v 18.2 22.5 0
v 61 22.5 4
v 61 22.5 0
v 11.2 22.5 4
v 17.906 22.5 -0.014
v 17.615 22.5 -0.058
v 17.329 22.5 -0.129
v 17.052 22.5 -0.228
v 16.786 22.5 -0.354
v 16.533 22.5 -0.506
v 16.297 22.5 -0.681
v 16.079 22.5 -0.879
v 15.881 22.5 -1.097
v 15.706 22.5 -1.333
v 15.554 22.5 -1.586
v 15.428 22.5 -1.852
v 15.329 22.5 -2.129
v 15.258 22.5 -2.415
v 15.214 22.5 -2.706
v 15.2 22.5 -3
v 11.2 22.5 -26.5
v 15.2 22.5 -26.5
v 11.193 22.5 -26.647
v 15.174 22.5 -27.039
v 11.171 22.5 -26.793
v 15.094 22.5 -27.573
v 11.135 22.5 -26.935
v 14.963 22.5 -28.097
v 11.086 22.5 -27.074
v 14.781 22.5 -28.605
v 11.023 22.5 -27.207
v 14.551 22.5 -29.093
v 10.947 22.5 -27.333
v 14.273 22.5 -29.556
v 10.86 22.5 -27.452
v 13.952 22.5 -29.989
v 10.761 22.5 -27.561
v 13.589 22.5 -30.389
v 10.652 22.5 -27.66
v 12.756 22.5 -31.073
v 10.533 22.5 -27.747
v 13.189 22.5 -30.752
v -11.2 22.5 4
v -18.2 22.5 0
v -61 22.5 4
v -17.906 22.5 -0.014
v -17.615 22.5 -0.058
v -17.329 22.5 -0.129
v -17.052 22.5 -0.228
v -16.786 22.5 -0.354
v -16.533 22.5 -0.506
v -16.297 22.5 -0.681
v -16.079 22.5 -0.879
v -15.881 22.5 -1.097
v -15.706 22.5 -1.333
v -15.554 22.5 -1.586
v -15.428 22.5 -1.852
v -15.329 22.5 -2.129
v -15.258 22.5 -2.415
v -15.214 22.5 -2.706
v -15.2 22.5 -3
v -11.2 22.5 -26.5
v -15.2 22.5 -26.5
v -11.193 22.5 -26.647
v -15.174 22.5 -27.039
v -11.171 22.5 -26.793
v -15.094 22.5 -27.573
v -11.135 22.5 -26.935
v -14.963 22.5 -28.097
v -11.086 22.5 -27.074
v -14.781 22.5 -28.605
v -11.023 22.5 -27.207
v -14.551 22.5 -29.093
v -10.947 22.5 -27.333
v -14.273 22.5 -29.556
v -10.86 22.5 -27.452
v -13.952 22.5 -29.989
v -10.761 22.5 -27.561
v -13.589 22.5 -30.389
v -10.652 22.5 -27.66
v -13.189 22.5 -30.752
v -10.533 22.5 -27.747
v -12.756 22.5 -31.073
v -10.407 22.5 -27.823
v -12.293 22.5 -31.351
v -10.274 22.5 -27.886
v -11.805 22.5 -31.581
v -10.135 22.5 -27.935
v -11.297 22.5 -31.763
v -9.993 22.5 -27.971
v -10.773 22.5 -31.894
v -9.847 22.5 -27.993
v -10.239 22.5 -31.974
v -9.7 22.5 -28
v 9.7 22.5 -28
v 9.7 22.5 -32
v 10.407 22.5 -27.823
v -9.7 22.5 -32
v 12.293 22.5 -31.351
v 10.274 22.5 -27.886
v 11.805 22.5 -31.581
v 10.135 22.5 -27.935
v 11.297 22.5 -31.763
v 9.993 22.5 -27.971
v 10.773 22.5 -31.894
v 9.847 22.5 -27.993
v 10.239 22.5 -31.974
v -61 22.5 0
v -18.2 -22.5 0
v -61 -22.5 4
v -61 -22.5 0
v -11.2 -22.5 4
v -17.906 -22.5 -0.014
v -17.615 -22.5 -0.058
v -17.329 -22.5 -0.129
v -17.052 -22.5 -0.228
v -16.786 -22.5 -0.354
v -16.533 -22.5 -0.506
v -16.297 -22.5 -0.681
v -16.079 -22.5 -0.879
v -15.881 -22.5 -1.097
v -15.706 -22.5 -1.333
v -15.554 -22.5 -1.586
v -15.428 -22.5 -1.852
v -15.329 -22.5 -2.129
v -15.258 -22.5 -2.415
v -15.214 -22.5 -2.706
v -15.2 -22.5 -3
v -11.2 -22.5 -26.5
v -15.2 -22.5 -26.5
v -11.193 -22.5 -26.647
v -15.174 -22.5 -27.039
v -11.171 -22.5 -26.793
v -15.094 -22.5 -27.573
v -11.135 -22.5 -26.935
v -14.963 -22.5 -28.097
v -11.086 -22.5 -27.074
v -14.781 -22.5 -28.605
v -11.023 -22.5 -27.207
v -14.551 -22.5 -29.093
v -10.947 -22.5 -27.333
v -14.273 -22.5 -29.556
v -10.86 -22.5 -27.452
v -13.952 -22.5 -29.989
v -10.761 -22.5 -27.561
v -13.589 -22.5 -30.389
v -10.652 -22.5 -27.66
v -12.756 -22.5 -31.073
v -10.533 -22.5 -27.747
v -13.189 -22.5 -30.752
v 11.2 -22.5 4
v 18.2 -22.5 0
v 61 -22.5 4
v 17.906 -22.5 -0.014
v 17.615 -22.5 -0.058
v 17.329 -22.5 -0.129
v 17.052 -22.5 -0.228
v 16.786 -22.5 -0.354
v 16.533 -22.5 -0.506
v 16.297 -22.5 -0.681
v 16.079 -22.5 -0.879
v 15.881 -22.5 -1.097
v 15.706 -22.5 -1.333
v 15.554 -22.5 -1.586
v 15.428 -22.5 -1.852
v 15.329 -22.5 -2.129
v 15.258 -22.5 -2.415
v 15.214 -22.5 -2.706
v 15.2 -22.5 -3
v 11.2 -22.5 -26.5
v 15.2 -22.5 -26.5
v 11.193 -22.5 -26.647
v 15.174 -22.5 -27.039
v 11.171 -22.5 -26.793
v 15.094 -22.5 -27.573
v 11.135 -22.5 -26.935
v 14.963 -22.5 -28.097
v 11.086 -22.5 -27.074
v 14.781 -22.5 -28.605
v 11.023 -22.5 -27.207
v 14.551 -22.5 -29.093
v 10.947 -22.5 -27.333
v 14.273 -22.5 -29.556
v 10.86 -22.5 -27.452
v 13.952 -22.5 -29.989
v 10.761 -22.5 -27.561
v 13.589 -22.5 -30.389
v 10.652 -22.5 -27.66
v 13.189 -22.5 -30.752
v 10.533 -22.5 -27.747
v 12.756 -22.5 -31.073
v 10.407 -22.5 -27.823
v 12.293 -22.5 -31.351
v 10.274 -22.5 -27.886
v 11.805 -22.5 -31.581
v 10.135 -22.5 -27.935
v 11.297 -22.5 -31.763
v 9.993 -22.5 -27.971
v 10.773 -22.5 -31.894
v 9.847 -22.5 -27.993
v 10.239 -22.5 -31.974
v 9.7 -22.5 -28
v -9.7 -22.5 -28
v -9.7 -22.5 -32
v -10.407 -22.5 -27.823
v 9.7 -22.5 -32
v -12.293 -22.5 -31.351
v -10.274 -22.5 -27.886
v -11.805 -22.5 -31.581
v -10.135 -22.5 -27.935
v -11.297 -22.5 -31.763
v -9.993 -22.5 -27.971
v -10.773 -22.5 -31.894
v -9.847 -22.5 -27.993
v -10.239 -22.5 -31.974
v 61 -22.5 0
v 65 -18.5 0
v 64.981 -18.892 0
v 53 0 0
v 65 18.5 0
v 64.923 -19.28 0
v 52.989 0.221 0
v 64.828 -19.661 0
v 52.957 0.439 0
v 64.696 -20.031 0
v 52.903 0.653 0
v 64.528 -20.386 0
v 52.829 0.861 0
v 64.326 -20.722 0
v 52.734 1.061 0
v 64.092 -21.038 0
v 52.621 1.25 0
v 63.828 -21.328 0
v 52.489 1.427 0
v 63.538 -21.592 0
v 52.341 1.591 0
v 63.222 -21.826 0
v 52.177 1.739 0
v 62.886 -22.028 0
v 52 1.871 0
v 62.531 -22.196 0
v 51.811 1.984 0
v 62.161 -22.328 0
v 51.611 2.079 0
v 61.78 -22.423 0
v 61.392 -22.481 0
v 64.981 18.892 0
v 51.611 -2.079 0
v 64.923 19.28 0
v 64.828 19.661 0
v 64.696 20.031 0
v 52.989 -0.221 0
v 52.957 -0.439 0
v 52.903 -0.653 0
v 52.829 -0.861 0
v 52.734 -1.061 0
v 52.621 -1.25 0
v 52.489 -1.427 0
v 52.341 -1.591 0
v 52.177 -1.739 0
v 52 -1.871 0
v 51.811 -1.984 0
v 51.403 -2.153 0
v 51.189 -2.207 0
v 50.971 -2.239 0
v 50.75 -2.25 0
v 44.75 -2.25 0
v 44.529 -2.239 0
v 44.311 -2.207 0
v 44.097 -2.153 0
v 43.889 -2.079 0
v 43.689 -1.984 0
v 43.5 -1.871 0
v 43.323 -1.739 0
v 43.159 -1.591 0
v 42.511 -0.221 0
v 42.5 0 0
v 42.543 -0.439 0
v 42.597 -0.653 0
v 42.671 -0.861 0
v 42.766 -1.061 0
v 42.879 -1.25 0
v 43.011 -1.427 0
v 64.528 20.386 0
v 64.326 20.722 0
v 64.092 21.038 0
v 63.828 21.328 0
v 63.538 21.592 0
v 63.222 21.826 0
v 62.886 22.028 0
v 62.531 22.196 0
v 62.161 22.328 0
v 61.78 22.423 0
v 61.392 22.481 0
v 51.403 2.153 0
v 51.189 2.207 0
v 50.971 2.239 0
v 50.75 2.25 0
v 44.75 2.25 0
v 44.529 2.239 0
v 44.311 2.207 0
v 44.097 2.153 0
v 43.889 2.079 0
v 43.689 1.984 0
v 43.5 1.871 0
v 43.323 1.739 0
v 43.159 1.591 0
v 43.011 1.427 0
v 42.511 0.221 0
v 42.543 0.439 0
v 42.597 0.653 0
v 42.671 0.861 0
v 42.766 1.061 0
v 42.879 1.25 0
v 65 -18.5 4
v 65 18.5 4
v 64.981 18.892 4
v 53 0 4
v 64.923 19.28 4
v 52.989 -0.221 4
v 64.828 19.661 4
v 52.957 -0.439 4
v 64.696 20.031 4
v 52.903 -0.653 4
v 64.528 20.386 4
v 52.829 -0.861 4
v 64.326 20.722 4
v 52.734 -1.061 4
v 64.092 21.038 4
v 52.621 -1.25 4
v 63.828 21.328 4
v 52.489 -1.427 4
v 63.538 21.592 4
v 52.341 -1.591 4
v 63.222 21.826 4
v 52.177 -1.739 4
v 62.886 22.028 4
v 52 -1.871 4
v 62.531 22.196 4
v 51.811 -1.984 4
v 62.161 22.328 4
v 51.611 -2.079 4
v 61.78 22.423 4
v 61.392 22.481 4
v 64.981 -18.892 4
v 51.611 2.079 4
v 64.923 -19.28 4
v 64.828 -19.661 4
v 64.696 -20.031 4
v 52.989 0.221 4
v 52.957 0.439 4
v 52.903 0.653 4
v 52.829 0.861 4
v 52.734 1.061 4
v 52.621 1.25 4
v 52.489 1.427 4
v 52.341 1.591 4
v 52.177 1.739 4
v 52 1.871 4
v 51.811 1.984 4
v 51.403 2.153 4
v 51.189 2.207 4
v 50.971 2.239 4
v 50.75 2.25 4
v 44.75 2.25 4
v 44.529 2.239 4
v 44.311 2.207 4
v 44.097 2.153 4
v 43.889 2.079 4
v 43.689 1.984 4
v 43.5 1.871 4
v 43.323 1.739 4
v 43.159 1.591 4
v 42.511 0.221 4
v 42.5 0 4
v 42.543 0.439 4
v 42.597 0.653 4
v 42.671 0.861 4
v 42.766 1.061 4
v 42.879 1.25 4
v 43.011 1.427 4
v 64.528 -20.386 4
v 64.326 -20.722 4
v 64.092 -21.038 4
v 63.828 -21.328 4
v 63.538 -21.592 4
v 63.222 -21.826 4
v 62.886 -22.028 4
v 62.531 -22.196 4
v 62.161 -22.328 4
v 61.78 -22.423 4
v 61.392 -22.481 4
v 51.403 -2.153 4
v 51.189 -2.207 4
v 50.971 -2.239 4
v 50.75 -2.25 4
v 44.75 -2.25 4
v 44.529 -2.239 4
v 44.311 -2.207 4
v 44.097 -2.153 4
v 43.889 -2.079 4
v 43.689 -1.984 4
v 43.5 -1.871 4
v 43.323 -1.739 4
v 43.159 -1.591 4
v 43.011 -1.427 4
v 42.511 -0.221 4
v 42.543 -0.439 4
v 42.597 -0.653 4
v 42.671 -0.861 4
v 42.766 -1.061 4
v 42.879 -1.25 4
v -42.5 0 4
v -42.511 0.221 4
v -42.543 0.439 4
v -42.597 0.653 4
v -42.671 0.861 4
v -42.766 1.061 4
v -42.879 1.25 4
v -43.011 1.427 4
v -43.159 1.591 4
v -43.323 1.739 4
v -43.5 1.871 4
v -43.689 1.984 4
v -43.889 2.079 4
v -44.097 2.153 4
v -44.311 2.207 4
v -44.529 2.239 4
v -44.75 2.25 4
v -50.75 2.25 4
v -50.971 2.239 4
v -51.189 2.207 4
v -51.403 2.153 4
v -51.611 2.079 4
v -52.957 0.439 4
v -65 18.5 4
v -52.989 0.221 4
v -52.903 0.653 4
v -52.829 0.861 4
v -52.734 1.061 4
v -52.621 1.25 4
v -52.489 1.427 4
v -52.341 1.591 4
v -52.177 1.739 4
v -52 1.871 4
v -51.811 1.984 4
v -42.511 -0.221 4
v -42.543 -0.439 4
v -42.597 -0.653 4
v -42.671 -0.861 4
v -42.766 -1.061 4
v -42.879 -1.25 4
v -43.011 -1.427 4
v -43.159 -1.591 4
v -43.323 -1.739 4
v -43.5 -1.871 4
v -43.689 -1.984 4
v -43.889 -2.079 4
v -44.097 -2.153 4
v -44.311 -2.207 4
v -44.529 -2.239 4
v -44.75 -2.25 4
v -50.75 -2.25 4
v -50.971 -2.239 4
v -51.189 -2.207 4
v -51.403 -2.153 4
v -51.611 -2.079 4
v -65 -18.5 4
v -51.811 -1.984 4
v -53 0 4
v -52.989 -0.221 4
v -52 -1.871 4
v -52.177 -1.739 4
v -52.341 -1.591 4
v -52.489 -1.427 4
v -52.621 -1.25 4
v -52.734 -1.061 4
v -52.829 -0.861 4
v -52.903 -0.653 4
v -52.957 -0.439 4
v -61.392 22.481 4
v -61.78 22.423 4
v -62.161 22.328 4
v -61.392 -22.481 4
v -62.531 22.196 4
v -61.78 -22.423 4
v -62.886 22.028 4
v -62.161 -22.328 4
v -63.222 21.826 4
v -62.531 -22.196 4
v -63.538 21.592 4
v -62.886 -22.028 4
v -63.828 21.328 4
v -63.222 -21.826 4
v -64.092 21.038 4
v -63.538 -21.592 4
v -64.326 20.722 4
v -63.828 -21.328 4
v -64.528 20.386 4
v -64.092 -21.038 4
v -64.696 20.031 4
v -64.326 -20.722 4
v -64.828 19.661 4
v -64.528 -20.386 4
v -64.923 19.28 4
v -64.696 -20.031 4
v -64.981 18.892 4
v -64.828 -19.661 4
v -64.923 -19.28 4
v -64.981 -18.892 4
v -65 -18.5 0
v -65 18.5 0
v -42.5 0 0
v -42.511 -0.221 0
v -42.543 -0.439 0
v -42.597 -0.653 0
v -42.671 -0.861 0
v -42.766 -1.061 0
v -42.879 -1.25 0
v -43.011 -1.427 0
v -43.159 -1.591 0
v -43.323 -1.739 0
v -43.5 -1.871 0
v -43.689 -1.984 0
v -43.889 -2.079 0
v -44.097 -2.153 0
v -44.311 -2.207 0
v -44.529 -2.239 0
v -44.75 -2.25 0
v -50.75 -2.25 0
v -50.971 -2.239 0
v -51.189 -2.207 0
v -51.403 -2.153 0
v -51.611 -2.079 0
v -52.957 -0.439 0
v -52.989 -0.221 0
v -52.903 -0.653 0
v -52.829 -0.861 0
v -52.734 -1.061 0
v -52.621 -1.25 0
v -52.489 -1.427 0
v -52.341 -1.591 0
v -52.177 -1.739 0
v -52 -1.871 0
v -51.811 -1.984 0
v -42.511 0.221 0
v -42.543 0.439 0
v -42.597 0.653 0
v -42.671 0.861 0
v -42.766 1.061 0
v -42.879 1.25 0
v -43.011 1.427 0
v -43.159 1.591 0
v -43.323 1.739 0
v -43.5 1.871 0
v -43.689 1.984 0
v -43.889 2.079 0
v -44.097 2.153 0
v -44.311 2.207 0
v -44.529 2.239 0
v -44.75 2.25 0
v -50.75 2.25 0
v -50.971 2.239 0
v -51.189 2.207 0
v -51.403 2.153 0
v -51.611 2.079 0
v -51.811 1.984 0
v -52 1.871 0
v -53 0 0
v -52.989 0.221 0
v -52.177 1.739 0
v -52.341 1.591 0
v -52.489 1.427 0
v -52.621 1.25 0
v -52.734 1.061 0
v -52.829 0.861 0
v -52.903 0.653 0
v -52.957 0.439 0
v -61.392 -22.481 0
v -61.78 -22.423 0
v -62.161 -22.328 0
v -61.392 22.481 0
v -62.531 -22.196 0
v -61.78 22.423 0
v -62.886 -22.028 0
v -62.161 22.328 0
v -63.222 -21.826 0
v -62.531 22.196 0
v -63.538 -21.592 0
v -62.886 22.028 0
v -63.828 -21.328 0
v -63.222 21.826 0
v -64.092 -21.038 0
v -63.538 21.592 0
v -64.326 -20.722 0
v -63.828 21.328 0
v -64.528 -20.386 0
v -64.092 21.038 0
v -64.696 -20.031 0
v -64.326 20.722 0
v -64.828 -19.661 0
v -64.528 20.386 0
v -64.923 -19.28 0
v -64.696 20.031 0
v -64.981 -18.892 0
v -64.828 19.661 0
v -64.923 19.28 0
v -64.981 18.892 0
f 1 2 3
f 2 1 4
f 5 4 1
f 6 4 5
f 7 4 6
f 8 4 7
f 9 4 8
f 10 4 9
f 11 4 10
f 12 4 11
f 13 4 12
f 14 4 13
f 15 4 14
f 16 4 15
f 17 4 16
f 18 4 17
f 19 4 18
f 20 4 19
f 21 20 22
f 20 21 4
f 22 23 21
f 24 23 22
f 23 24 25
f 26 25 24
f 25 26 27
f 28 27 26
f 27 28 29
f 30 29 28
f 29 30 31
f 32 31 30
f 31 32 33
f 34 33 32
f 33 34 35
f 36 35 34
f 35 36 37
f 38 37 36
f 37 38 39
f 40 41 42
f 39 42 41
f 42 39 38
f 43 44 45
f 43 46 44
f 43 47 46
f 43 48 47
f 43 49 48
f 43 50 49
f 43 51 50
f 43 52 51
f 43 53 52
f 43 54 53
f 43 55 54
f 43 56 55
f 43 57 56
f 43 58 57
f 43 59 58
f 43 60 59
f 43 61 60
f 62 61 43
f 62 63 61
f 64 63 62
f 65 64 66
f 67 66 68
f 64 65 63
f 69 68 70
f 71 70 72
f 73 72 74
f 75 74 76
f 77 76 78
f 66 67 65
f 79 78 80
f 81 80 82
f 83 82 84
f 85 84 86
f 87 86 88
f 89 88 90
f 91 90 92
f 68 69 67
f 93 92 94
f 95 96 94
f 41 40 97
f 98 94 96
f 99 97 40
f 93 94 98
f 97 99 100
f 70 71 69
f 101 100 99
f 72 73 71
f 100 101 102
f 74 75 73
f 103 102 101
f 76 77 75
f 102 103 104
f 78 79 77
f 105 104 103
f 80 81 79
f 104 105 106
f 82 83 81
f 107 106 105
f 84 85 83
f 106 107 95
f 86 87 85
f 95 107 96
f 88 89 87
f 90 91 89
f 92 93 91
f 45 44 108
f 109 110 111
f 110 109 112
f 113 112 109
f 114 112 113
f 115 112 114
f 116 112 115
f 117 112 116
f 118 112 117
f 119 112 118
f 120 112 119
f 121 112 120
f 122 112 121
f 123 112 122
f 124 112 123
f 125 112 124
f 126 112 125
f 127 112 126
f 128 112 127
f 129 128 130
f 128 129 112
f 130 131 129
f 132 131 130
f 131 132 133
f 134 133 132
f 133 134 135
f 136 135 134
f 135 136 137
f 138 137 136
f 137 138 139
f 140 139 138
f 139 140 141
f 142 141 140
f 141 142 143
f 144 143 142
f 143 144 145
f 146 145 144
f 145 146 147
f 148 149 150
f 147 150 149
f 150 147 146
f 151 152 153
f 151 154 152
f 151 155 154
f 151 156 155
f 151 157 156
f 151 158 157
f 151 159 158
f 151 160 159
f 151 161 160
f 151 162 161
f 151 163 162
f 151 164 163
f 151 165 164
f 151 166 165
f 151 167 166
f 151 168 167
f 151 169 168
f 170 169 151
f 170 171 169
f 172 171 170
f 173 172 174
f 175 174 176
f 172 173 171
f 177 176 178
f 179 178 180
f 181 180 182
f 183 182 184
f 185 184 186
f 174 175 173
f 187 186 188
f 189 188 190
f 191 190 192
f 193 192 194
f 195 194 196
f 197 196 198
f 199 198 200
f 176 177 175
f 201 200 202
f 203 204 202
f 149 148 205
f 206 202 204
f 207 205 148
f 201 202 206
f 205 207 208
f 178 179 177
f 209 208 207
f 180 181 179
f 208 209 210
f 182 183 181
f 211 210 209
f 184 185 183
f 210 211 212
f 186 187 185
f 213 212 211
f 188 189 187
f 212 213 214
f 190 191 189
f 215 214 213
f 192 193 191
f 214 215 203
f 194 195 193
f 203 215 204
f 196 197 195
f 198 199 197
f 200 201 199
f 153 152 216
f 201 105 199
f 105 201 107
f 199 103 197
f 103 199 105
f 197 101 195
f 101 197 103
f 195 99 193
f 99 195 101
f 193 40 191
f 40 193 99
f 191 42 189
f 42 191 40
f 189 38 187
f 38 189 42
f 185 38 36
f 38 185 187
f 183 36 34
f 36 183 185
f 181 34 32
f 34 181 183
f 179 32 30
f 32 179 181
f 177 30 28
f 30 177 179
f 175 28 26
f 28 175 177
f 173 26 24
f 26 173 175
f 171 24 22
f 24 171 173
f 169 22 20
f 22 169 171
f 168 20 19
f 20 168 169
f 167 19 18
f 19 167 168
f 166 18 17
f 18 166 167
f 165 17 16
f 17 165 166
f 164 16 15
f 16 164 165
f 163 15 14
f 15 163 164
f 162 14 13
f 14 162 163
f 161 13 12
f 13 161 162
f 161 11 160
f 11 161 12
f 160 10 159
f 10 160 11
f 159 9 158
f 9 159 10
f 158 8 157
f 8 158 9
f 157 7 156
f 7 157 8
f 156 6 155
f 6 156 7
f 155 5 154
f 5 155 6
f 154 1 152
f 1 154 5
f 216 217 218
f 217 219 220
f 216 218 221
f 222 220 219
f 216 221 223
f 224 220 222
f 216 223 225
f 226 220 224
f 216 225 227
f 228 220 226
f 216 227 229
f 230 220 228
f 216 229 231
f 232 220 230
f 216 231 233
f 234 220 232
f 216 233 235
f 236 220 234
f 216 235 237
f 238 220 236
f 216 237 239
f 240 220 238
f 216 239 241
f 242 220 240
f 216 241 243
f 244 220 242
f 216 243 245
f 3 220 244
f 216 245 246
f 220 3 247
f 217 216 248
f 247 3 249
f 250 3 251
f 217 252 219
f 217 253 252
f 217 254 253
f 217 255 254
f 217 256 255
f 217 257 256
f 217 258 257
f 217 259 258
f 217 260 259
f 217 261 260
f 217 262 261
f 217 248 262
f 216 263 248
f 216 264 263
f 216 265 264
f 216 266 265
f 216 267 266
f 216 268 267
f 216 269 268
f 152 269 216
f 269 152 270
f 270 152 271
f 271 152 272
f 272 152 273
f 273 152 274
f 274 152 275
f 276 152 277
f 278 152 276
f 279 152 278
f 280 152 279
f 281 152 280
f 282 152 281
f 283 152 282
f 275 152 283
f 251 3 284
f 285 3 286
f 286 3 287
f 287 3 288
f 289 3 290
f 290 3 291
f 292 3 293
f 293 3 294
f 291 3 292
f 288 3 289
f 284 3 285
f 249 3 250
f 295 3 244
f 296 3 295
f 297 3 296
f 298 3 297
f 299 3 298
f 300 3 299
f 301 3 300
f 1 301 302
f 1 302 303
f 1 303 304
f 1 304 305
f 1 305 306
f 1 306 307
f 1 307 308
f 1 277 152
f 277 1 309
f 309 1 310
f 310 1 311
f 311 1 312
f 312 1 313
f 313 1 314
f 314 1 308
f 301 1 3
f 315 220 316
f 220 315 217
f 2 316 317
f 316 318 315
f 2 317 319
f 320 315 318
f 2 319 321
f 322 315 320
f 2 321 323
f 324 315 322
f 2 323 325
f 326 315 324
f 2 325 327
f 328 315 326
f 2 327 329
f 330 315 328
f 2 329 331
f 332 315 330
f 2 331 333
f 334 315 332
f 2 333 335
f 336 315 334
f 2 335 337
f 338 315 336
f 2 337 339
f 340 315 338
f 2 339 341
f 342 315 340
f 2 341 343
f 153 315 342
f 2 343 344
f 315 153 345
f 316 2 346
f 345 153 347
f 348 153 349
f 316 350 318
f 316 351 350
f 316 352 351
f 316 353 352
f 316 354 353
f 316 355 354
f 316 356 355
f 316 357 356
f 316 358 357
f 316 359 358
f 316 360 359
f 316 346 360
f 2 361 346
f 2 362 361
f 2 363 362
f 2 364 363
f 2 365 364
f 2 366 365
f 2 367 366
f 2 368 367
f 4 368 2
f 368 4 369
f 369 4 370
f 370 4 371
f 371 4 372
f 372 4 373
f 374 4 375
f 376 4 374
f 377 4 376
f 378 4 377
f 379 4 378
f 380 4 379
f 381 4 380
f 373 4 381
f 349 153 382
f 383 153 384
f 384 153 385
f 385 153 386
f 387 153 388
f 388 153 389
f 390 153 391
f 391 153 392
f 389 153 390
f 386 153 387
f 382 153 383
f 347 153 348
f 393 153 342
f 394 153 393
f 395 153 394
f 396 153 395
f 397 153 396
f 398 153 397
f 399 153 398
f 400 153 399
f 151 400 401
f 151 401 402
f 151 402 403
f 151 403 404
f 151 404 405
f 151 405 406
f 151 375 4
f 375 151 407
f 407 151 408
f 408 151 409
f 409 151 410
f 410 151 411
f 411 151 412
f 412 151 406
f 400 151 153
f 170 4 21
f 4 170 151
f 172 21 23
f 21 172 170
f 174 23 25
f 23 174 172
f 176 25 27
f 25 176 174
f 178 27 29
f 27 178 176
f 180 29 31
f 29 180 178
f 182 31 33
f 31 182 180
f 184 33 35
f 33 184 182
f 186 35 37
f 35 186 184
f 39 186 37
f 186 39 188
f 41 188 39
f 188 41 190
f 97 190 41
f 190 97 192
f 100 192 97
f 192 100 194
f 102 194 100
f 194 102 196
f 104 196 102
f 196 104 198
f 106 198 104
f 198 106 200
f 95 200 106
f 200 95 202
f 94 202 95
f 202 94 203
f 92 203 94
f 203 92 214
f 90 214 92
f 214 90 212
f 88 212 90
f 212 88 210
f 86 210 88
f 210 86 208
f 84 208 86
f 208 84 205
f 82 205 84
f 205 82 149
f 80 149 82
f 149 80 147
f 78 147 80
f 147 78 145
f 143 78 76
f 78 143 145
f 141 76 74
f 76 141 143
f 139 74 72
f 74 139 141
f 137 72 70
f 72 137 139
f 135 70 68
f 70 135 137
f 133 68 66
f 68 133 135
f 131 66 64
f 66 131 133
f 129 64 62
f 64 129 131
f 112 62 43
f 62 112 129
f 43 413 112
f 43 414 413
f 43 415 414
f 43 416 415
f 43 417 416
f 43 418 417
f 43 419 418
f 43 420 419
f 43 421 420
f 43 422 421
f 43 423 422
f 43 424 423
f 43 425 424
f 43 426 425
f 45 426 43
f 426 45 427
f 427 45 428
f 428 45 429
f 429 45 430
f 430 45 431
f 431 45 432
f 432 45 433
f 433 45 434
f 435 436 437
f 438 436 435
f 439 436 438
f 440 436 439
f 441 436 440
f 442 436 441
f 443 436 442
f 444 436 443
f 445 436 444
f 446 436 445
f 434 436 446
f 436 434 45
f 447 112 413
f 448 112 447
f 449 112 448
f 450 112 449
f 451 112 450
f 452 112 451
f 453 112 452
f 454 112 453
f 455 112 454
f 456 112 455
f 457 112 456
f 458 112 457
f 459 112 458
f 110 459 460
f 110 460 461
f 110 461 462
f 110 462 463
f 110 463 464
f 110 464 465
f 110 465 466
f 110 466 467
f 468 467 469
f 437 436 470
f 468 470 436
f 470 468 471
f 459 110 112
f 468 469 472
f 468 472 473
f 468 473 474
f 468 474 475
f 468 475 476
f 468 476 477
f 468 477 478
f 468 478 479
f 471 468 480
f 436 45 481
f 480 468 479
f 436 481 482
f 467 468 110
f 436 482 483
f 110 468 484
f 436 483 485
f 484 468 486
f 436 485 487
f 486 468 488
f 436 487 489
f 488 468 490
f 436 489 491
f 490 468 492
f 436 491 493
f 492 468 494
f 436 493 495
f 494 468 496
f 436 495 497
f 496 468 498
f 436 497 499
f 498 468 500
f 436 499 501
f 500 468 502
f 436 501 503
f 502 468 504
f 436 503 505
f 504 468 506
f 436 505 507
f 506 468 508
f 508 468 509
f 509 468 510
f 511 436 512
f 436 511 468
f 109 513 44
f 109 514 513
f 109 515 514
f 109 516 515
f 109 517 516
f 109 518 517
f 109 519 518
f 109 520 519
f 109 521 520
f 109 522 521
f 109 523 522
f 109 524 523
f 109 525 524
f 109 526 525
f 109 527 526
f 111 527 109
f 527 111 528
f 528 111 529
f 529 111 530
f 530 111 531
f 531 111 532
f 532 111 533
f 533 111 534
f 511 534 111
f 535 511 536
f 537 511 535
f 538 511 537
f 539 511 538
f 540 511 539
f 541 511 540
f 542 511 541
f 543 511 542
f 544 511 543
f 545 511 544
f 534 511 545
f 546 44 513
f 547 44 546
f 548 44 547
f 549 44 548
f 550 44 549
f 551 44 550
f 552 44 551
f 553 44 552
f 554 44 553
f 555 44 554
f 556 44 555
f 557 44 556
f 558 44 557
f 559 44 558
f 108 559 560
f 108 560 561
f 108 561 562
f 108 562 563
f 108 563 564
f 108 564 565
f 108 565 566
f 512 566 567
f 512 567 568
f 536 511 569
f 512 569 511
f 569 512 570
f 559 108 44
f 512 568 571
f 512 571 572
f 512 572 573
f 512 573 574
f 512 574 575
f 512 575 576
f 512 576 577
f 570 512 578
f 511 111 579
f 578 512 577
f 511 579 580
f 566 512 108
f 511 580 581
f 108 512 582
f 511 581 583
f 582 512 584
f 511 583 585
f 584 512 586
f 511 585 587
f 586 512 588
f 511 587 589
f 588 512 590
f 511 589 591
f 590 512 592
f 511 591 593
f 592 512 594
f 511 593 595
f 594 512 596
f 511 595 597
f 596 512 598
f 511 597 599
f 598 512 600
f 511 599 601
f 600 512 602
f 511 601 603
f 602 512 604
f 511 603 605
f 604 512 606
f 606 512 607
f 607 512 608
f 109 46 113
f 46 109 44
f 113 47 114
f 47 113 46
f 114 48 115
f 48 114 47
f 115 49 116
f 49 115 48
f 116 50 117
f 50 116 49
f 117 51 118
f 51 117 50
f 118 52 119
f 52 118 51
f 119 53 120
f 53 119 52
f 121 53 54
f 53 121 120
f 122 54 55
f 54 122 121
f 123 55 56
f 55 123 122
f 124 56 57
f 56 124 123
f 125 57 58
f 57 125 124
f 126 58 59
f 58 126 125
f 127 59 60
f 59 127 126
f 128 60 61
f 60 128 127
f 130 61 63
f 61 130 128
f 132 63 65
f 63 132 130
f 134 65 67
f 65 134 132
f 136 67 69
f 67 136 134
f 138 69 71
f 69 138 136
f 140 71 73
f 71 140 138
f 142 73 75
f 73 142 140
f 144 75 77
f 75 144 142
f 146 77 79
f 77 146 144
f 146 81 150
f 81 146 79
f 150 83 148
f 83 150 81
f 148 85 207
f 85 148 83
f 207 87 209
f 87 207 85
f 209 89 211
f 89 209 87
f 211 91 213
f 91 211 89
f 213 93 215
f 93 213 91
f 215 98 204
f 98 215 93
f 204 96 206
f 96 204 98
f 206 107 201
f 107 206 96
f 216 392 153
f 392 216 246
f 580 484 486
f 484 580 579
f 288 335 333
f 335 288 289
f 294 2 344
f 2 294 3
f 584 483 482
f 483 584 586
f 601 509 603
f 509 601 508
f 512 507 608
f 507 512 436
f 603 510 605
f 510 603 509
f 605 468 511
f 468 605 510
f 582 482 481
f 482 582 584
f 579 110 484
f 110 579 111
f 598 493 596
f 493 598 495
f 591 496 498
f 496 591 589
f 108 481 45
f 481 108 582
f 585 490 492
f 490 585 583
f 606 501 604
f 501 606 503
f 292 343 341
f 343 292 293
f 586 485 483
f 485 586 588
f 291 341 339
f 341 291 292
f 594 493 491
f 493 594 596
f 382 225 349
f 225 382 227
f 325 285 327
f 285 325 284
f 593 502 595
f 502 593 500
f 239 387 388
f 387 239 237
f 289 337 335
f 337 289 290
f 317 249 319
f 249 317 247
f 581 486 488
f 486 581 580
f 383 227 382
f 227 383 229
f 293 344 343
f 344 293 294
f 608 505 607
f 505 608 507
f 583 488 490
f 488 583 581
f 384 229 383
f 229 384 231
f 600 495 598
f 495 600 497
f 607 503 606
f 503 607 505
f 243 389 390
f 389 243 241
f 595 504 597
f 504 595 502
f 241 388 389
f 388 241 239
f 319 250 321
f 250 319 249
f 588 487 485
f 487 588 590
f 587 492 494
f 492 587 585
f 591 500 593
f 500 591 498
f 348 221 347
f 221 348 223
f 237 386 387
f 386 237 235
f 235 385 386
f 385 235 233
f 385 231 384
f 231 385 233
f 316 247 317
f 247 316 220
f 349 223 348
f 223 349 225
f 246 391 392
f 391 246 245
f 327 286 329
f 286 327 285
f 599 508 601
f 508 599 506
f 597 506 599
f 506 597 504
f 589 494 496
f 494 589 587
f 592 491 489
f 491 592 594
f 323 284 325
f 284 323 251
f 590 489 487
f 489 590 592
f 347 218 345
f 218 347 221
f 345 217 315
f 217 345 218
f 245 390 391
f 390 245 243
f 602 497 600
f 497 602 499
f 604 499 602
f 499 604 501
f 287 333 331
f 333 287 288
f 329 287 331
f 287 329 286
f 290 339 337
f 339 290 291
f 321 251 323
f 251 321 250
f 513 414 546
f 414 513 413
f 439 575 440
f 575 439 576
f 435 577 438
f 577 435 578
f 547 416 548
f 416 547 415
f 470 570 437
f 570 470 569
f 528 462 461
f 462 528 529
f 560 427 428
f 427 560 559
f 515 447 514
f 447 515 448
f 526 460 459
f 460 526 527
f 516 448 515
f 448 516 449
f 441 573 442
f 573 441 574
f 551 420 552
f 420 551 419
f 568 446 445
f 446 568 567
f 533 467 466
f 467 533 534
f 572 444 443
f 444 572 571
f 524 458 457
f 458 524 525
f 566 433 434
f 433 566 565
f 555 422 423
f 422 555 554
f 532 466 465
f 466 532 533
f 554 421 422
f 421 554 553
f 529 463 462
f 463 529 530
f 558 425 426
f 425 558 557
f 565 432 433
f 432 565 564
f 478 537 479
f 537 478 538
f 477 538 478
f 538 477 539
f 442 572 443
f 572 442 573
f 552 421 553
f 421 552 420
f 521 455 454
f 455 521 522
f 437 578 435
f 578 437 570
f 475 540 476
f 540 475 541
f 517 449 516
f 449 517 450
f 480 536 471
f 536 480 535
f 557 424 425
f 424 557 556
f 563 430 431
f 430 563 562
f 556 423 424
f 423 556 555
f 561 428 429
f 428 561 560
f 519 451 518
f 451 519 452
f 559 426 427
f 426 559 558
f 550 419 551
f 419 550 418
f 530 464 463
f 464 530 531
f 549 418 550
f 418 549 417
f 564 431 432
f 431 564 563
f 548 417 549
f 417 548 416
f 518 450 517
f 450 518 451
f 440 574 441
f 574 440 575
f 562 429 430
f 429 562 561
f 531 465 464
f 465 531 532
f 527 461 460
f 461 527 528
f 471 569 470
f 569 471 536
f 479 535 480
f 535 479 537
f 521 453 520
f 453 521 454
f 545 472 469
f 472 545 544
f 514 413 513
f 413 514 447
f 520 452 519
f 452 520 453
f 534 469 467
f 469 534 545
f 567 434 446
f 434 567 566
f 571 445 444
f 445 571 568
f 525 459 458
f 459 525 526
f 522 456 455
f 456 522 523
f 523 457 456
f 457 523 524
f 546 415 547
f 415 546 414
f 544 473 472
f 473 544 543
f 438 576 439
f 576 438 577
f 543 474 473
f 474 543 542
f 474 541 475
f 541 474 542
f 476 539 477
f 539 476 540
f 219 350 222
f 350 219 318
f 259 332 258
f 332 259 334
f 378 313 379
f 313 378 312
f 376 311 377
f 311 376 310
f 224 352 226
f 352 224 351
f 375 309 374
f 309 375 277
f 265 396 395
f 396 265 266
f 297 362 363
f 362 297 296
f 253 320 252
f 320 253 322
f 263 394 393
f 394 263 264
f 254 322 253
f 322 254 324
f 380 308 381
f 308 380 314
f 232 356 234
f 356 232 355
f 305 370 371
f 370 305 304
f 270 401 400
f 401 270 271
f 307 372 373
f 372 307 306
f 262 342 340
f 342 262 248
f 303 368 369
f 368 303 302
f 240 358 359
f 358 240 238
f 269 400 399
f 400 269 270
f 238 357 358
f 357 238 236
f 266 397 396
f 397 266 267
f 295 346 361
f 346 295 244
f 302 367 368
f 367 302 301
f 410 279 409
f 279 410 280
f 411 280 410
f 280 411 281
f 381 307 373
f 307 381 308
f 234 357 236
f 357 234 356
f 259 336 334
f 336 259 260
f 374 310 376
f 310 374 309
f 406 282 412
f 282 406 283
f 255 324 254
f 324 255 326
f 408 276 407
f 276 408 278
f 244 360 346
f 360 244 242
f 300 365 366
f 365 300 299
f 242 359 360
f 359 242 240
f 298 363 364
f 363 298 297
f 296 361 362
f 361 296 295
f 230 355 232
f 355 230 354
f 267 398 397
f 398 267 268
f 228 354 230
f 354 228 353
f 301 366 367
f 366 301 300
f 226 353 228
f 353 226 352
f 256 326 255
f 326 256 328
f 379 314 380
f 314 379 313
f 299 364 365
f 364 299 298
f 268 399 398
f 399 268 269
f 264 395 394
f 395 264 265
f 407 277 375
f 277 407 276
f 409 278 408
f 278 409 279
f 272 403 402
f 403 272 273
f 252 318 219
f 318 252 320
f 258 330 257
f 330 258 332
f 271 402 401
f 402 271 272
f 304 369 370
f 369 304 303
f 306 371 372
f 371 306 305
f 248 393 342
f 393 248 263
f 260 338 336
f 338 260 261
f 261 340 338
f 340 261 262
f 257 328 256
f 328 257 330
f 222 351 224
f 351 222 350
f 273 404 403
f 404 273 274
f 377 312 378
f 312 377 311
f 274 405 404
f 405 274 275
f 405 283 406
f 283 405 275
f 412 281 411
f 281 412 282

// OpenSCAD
// Mini-PC mount for a monitor arm
//
// A 130 x 45 mm plate with a U-shaped "step" in the middle that wraps
// around the monitor arm. The computer screws onto the two flat wings
// through slotted M3 holes (95.5 mm nominal spacing); the arm ends up
// clamped between the U channel and the underside of the computer.
//
//        computer sits on top of this face (z = plate_t)
//   ______________________        ______________________
//  |__o_(slot)____________|      |____________(slot)_o__|
//                         |      |
//                         | arm  |   <- 22 x 32 channel
//                         |______|
//
// Axes: X = along the 130 mm length, Y = along the 45 mm width
// (also the direction the arm runs), Z = up (computer side).

/* [Plate] */
plate_len   = 130;   // overall length (X)
plate_wid   = 45;    // overall width (Y), also the arm contact length
plate_t     = 4;     // thickness of the flat wings and channel walls
corner_r    = 4;     // plan-view rounding of the plate's outer corners

/* [Arm channel (step)] */
arm_w       = 22;    // arm width  -> channel inner width
arm_h       = 32;    // arm height -> channel inner depth
fit_w       = 0.4;   // extra width so the arm slides in
fit_h       = 0;     // extra depth; make negative (e.g. -0.3) for a tighter clamp
arm_r       = 1.5;   // inner radius at the bottom of the channel
bend_r      = 3;     // fillet where the wings meet the channel walls

/* [Computer mounting holes] */
hole_spacing = 95.5; // nominal centre-to-centre distance (X)
hole_y       = 0;    // Y offset of the holes from the plate centre line
hole_d       = 4.5;  // M4 clearance
slot_travel  = 6;    // total slot length beyond the hole (+/- 3 mm)
washer_od    = 7;    // M3 washer (DIN 125), only used for the sanity checks

$fn = 64;

// ---- derived ----------------------------------------------------------
eps  = 0.01;
cw   = arm_w + fit_w;          // channel inner width
ch   = arm_h + fit_h;          // channel inner depth (from the top face)
cow  = cw + 2 * plate_t;       // channel outer width

// Keep the washer seated on flat material, clear of the plate end and
// of the bend fillet.
slot_min_x = hole_spacing / 2 - slot_travel / 2 - washer_od / 2;
slot_max_x = hole_spacing / 2 + slot_travel / 2 + washer_od / 2;
assert(slot_min_x > cow / 2 + bend_r,
       "Washer would overlap the channel fillet: reduce slot_travel or bend_r");
assert(slot_max_x < plate_len / 2 - corner_r / 2,
       "Washer would overhang the plate end: reduce slot_travel");
assert(abs(hole_y) + washer_od / 2 < plate_wid / 2,
       "Washer would overhang the plate side: reduce hole_y");

// ---- 2D helpers (profile lives in the XZ plane, drawn as XY) ----------

// Rectangle centred on x = 0, spanning y = [0, h], with only the two
// bottom corners rounded to radius r.
module u_rect(w, h, r) {
    r = max(r, eps);
    hull() {
        for (s = [-1, 1])
            translate([s * (w / 2 - r), r]) circle(r);
        translate([-w / 2, h - eps]) square([w, eps]);
    }
}

// Concave fillet filling the inside corner at the origin, extending
// into +x / -y.
module inside_fillet(r) {
    difference() {
        translate([0, -r]) square([r, r]);
        translate([r, -r]) circle(r);
    }
}

// Cross-section of the whole part.
module profile() {
    difference() {
        union() {
            // flat wings
            translate([-plate_len / 2, 0]) square([plate_len, plate_t]);
            // channel outer shell
            translate([0, -ch]) u_rect(cow, ch + plate_t, arm_r + plate_t);
            // fillets where the wings meet the channel
            for (m = [0, 1]) mirror([m, 0])
                translate([cow / 2, 0]) inside_fillet(bend_r);
        }
        // arm cavity, open towards the computer
        translate([0, plate_t - ch]) u_rect(cw, ch + 1, arm_r);
    }
}

// ---- 3D ---------------------------------------------------------------

module slot() {
    hull()
        for (s = [-1, 1])
            translate([s * slot_travel / 2, 0, 0])
                cylinder(d = hole_d, h = 3 * plate_t, center = true);
}

module plan_outline() {
    offset(r = corner_r) offset(delta = -corner_r)
        square([plate_len, plate_wid], center = true);
}

module mount() {
    difference() {
        intersection() {
            rotate([90, 0, 0])
                linear_extrude(plate_wid, center = true) profile();
            // round the plate's outer corners in plan view
            translate([0, 0, -ch - 1])
                linear_extrude(ch + plate_t + 2) plan_outline();
        }
        for (s = [-1, 1])
            translate([s * hole_spacing / 2, hole_y, plate_t / 2]) slot();
    }
}

mount();
